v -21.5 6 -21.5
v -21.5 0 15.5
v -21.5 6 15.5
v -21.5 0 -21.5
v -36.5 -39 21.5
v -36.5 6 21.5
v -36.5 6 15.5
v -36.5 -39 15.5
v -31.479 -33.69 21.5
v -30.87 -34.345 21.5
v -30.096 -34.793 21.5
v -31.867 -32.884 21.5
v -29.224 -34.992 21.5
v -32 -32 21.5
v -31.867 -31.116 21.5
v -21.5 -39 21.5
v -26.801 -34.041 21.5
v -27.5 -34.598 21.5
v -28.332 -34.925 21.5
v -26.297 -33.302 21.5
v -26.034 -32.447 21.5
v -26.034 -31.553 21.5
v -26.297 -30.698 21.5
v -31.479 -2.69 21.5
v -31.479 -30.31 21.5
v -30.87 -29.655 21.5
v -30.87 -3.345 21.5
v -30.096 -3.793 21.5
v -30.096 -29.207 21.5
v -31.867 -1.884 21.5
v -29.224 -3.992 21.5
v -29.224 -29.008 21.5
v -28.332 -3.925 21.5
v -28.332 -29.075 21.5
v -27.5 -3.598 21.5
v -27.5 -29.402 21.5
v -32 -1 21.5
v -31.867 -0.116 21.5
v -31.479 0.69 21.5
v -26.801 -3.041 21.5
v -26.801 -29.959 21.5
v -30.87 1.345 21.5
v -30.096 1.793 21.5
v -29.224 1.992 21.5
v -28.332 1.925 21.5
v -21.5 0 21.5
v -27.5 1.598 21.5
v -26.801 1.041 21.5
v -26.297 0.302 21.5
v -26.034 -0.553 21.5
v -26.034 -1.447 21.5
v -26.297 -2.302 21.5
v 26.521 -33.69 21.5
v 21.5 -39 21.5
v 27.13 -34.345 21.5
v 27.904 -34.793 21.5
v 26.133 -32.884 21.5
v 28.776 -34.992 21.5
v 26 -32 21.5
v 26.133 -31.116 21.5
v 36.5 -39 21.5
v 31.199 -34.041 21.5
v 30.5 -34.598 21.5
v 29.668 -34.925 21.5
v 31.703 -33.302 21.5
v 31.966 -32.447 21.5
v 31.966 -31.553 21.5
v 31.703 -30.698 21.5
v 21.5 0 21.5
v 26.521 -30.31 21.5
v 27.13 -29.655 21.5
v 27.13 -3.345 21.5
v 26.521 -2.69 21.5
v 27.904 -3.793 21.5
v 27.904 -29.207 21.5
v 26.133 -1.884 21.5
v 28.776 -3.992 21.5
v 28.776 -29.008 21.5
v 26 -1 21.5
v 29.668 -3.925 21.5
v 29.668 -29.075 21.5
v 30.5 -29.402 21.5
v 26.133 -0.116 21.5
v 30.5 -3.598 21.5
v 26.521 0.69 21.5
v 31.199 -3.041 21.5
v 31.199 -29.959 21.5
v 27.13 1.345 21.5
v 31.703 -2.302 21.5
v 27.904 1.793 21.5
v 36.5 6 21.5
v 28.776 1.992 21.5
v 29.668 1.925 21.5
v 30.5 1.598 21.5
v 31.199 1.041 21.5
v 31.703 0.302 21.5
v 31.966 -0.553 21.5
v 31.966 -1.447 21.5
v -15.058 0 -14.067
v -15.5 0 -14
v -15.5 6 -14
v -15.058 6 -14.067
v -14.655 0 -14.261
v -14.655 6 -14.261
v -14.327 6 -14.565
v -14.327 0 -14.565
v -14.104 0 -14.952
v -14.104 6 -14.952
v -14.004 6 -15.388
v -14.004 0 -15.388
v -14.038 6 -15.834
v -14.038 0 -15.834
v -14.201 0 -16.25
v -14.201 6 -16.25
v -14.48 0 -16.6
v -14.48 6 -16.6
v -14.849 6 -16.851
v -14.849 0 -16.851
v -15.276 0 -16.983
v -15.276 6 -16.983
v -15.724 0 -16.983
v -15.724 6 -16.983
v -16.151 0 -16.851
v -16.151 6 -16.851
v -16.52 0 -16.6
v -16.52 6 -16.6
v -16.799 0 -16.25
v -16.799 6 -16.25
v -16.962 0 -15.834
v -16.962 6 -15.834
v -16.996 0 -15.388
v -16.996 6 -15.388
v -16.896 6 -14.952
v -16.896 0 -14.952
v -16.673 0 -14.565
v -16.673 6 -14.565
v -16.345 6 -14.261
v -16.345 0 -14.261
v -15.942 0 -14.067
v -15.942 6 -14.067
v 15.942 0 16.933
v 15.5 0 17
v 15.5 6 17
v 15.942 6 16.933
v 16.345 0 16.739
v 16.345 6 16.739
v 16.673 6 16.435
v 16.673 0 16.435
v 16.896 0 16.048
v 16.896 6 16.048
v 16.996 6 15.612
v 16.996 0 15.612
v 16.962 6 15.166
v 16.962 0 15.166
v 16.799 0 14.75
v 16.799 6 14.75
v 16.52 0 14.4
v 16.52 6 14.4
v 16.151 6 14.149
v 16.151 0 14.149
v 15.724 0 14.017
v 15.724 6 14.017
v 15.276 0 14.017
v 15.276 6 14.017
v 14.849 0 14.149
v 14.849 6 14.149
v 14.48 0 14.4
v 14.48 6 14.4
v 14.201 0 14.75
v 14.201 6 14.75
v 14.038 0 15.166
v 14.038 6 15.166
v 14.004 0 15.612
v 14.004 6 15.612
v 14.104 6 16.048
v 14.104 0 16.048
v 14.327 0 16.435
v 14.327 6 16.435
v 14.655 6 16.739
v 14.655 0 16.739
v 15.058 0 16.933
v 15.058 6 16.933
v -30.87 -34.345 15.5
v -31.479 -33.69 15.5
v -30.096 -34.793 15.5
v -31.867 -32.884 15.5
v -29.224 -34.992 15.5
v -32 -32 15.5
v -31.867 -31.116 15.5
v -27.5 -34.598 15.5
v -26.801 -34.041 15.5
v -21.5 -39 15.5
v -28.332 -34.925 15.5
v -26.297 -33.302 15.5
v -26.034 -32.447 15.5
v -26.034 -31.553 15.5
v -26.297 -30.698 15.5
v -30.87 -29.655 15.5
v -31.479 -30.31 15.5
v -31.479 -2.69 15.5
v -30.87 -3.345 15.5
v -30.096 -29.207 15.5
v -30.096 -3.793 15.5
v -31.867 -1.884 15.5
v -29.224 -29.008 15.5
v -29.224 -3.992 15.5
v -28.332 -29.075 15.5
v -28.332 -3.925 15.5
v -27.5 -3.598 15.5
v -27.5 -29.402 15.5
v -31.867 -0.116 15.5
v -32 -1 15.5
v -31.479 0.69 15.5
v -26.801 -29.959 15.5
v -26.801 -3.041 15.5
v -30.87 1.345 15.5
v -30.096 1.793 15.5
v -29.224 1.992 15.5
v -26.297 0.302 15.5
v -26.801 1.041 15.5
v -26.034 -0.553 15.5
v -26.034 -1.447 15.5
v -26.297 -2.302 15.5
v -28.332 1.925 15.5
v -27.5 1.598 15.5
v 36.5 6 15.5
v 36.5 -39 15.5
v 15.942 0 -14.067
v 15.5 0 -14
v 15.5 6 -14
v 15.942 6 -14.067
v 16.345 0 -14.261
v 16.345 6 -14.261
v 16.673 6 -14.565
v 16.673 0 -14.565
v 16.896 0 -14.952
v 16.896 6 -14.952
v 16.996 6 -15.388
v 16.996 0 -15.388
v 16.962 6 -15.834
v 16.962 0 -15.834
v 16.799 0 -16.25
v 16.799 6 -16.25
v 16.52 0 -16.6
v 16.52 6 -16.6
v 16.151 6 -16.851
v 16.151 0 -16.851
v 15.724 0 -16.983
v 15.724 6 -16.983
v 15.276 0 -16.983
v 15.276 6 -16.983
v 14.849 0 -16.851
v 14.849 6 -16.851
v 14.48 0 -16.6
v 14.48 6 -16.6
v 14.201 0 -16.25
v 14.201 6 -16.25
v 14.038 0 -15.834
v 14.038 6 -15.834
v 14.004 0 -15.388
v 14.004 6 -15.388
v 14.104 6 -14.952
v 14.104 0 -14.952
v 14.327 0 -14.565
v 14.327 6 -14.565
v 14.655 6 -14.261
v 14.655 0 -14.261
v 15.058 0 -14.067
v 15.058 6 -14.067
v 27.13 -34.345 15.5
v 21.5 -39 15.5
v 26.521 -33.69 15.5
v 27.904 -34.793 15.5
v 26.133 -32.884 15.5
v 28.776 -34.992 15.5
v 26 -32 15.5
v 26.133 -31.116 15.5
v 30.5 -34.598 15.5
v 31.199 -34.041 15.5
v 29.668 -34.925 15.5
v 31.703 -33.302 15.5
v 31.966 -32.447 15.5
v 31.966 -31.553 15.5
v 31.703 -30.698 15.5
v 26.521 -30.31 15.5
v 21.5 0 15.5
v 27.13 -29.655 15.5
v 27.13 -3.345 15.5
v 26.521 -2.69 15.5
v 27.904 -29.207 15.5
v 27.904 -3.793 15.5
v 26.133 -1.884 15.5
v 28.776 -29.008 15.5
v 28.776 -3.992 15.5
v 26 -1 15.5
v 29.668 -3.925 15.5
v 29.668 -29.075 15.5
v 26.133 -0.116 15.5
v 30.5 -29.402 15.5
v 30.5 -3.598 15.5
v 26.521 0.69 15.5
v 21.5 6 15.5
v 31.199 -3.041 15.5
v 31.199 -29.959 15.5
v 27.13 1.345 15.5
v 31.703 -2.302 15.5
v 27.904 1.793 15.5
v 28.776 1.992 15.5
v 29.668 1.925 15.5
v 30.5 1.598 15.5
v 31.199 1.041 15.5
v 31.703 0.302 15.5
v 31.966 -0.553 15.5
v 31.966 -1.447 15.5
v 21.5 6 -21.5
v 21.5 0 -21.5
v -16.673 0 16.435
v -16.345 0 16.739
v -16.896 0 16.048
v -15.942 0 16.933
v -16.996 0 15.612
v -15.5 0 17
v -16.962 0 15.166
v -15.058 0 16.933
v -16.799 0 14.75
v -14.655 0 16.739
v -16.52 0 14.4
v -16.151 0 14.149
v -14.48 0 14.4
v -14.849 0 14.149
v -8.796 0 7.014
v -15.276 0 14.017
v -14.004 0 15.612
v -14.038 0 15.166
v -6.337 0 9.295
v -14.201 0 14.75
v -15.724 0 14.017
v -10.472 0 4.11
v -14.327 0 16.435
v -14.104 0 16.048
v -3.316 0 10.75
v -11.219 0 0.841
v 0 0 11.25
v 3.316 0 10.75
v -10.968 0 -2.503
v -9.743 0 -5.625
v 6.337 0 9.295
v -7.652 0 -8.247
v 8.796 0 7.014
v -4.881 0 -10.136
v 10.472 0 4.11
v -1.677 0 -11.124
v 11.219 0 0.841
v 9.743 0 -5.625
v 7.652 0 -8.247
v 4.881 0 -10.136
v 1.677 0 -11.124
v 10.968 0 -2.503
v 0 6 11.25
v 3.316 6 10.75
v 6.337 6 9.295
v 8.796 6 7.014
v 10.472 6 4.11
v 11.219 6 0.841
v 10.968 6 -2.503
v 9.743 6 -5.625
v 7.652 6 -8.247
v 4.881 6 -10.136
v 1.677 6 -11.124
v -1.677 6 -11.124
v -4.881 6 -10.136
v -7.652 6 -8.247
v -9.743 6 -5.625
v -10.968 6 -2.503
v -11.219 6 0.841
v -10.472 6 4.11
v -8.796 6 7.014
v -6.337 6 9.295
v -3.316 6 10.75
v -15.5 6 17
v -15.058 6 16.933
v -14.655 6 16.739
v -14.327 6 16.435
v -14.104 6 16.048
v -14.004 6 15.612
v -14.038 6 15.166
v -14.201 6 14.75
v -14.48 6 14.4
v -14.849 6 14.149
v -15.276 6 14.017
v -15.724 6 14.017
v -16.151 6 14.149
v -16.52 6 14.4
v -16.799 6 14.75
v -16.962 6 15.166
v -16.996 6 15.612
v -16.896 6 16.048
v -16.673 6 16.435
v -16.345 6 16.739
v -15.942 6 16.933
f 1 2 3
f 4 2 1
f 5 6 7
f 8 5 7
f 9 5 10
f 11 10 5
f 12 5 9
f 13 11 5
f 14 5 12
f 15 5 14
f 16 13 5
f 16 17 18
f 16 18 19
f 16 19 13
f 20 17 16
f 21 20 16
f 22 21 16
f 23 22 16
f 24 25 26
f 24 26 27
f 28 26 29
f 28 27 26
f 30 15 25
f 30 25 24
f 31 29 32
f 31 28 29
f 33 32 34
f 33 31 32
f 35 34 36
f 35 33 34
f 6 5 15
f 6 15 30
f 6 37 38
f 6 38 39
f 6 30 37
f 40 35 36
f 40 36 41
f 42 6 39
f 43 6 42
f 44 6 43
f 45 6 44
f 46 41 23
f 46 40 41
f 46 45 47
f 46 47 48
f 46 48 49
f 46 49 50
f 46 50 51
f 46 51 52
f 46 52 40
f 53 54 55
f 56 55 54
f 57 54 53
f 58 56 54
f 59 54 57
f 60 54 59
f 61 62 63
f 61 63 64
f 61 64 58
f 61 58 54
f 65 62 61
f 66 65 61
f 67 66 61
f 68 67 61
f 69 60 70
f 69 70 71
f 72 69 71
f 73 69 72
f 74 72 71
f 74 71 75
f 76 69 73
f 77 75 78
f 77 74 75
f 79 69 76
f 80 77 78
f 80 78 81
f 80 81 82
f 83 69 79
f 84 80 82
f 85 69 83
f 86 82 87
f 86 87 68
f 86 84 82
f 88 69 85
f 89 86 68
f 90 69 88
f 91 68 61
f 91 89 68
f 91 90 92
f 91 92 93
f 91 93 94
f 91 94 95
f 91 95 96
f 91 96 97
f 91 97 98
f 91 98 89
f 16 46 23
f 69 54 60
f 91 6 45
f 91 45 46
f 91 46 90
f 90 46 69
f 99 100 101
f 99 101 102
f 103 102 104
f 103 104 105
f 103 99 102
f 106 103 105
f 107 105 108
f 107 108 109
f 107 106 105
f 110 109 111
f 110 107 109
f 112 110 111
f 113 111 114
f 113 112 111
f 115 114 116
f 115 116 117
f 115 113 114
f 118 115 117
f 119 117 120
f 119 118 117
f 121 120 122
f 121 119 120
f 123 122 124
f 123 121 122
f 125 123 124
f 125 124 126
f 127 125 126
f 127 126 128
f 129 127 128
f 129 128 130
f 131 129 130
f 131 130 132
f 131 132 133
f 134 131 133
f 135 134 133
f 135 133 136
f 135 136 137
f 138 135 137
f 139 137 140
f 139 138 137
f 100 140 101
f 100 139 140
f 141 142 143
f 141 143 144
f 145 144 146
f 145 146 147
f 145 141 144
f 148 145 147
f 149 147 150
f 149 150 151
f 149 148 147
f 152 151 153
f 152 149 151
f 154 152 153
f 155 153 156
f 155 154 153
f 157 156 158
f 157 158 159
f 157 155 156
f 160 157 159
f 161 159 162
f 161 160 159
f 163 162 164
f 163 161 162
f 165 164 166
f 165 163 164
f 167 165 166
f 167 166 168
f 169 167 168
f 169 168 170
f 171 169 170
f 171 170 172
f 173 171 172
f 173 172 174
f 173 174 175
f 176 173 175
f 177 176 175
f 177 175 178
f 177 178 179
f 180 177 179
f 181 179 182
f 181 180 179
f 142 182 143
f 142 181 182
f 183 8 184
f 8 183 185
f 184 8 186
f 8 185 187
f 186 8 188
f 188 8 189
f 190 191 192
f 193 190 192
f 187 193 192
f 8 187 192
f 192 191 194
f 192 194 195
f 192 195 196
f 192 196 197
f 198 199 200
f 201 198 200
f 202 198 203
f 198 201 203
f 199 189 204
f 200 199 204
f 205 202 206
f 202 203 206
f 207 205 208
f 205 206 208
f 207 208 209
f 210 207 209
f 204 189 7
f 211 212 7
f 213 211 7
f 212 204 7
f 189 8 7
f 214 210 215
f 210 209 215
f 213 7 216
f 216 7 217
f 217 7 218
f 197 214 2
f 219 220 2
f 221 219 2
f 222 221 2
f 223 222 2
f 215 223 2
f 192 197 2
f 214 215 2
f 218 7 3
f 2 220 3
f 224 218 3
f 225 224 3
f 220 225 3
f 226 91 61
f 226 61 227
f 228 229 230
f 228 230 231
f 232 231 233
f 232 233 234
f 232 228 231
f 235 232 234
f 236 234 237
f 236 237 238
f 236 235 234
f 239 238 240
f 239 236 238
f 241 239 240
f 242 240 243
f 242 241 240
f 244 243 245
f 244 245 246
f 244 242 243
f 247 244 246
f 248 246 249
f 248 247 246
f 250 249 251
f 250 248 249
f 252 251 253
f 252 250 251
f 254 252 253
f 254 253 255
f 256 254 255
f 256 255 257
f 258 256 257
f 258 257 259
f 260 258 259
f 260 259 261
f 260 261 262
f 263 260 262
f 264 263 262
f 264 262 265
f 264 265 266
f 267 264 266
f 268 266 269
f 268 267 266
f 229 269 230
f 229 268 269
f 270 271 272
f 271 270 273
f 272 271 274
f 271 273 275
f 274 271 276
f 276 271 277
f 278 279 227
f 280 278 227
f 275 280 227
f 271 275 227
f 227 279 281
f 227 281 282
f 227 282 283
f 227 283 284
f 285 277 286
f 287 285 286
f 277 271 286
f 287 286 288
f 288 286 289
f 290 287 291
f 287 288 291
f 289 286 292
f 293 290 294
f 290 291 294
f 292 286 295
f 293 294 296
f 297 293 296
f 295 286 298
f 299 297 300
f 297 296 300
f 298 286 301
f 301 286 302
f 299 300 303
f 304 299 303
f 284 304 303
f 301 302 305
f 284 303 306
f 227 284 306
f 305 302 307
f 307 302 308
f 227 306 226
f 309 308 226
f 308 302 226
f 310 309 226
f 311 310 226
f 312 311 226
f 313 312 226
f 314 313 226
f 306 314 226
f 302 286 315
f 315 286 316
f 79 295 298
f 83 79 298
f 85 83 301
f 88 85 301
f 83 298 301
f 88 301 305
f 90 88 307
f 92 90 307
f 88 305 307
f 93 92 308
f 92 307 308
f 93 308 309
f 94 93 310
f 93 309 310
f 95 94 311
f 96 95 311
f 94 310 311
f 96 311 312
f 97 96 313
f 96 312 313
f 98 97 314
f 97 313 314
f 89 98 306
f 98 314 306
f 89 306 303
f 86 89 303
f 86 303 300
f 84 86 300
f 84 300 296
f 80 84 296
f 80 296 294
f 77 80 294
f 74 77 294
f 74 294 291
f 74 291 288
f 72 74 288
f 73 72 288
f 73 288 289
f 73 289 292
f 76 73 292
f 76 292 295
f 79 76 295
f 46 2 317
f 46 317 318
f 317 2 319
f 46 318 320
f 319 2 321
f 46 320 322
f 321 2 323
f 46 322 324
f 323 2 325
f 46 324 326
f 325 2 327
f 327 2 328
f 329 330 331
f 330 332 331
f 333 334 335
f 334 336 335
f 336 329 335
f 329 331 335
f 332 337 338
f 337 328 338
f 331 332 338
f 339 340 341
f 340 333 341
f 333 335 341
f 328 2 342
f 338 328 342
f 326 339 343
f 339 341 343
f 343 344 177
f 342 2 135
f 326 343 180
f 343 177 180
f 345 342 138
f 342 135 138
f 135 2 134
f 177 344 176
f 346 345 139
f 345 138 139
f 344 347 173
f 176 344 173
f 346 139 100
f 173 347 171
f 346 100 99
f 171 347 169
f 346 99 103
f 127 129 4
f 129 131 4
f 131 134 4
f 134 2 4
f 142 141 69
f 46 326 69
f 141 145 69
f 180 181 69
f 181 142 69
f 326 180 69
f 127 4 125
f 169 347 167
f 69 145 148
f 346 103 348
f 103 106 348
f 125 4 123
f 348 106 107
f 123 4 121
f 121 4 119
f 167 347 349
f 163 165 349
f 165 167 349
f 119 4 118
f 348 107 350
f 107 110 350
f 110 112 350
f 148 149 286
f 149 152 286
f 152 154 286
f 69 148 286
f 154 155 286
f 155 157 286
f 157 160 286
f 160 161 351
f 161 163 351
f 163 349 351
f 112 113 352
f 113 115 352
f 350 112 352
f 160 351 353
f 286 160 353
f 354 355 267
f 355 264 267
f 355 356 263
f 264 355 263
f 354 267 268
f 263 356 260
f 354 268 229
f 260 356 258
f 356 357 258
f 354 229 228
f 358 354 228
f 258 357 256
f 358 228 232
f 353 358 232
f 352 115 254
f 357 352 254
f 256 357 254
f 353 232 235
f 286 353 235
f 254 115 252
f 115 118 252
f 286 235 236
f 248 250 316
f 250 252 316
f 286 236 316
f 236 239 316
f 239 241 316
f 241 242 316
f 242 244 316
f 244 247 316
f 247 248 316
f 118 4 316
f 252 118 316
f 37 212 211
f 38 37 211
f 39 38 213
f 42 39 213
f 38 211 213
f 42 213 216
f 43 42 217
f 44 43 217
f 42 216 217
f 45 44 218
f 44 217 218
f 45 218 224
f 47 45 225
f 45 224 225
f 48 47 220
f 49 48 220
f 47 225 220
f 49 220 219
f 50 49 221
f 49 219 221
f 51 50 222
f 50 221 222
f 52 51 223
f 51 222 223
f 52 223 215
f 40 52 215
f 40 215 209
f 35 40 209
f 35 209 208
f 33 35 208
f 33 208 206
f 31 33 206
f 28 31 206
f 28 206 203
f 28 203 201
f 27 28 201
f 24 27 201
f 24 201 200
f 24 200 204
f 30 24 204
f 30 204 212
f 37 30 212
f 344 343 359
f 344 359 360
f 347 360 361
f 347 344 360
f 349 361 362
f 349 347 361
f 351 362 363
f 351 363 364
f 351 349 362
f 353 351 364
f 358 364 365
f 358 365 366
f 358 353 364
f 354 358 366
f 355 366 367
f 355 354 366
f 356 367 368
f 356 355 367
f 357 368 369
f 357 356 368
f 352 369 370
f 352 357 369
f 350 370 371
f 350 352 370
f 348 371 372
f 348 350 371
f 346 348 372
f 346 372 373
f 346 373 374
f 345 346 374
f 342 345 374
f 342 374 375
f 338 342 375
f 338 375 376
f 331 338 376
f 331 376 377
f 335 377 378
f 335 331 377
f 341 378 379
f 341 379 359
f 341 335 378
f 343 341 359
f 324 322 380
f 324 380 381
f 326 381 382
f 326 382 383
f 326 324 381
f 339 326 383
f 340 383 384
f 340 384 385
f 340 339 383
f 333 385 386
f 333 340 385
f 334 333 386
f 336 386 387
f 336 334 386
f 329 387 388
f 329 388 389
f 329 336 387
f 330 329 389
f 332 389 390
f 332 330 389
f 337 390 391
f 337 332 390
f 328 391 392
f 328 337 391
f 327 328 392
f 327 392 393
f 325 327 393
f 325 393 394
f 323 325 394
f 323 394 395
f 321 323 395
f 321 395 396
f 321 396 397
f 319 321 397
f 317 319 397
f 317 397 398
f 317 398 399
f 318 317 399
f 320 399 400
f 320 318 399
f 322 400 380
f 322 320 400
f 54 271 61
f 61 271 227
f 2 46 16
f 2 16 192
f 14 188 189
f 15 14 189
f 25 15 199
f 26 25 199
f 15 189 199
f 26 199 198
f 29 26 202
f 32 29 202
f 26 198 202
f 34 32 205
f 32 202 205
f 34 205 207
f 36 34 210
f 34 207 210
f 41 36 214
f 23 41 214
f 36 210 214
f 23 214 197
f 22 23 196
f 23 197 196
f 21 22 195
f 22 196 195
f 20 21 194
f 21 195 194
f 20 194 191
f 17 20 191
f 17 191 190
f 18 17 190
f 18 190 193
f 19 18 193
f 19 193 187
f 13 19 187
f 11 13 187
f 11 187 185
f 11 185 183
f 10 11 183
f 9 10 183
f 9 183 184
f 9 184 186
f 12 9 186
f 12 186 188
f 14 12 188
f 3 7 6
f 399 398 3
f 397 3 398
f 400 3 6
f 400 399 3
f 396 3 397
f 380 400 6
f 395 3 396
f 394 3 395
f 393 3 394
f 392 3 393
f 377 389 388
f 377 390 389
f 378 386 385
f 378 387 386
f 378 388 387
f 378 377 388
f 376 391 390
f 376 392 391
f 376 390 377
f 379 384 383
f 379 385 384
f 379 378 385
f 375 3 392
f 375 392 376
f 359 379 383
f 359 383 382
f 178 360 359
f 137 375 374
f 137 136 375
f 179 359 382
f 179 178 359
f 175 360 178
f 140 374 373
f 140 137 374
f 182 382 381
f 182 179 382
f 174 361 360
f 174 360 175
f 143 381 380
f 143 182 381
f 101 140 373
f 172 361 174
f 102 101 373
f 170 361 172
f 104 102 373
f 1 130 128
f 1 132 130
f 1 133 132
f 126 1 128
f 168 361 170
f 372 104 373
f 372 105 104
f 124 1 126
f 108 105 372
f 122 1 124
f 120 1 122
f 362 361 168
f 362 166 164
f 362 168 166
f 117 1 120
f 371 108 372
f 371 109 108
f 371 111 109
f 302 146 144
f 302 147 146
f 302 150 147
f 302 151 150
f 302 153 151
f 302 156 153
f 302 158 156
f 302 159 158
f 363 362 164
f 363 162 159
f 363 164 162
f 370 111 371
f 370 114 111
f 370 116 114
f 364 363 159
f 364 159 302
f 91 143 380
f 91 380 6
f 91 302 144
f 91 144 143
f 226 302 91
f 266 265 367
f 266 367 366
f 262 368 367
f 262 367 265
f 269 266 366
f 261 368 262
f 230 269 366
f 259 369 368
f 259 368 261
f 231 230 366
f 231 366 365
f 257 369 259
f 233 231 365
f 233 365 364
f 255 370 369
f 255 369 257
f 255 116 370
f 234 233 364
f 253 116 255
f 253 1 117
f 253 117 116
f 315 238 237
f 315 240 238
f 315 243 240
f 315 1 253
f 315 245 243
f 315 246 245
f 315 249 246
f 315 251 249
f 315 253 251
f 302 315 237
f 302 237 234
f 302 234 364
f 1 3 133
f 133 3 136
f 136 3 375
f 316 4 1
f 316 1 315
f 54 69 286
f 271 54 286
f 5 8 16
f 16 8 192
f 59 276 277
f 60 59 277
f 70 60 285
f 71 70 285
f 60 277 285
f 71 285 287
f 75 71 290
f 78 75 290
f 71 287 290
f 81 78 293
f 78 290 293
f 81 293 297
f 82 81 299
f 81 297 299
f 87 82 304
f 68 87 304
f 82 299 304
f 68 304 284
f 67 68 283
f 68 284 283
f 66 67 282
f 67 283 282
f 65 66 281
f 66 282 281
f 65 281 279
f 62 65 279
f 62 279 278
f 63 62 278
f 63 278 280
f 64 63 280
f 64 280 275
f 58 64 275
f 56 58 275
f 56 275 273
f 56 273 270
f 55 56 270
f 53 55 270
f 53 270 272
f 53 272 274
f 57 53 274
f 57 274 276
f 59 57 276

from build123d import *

# Parameters (mm, degrees)
CROQUIS1_W              = 43
CROQUIS1_H              = 43
CROQUIS1_R              = 1.5
CROQUIS1_R_2            = 11.25
SALIENTE_EXTRUIR1_DEPTH = 6
CROQUIS2_W              = 15
CROQUIS2_H              = 6
SALIENTE_EXTRUIR2_DEPTH = 45
CROQUIS3_R              = 3
CORTAR_EXTRUIR1_DEPTH   = 45


with BuildPart() as part:
    # Croquis1 → Saliente-Extruir1 (new body)
    with BuildSketch(Plane(origin=(0, 0, 0), x_dir=(1, 0, 0), z_dir=(0, 1, 0))):
        Rectangle(CROQUIS1_W, CROQUIS1_H)
        with Locations(Location((-15.5, 15.5, 0), (0, 0, 270))):
            Circle(CROQUIS1_R, mode=Mode.SUBTRACT)
        with Locations(Location((15.5, 15.5, 0), (0, 0, 270))):
            Circle(CROQUIS1_R, mode=Mode.SUBTRACT)
        with Locations(Location((-15.5, -15.5, 0), (0, 0, 270))):
            Circle(CROQUIS1_R, mode=Mode.SUBTRACT)
        with Locations(Location((15.5, -15.5, 0), (0, 0, 270))):
            Circle(CROQUIS1_R, mode=Mode.SUBTRACT)
        with Locations(Location((0, 0, 0), (0, 0, 270))):
            Circle(CROQUIS1_R_2, mode=Mode.SUBTRACT)
    extrude(amount=SALIENTE_EXTRUIR1_DEPTH)

    # Croquis2 → Saliente-Extruir2 (add)
    with BuildSketch(Plane(origin=(0, 6, 0), x_dir=(1, 0, 0), z_dir=(0, 1, 0))):
        with Locations((-29, -18.5)):
            Rectangle(CROQUIS2_W, CROQUIS2_H)
        with Locations((29, -18.5)):
            Rectangle(CROQUIS2_W, CROQUIS2_H)
    extrude(amount=-SALIENTE_EXTRUIR2_DEPTH)

    # Croquis3 → Cortar-Extruir1 (cut)
    with BuildSketch(Plane(origin=(0, 0, 15.5), x_dir=(-1, 0, 0), z_dir=(0, 0, -1))):
        with Locations((-29, -32)):
            Circle(CROQUIS3_R)
        with Locations((-29, -1)):
            Circle(CROQUIS3_R)
        with Locations((29, -1)):
            Circle(CROQUIS3_R)
        with Locations((29, -32)):
            Circle(CROQUIS3_R)
    extrude(amount=-CORTAR_EXTRUIR1_DEPTH, mode=Mode.SUBTRACT)


solid = part.part
